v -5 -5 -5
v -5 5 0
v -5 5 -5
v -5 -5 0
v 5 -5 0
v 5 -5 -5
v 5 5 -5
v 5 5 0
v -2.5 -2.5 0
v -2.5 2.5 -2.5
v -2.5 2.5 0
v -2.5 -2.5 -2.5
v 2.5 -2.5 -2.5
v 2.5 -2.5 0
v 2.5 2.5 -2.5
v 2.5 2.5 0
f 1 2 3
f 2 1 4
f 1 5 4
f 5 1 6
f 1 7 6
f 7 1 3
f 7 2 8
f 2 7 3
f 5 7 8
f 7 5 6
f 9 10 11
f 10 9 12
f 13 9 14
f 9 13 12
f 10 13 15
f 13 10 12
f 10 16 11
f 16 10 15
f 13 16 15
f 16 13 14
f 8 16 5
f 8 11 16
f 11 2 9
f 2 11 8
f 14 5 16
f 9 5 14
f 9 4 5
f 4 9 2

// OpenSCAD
// In CGAL mode, there should be a cavity
difference() {
  polyhedron(convexity=2, faces=[[2,1,0],[3,1,2],[4,0,1],[4,1,5],[4,2,0],[6,2,4],[6,3,2],[7,3,6],[5,1,3],[5,3,7],[6,4,5],[6,5,7],[9,10,8],[9,11,10],[8,12,9],[9,12,13],[10,12,8],[10,14,12],[11,14,10],[11,15,14],[9,13,11],[11,13,15],[12,14,13],[13,14,15]],
points=[[-5,-5,-5],[-5,-5,5],[-5,5,-5],[-5,5,5],[5,-5,-5],[5,-5,5],[5,5,-5],[5,5,5],[-2.5,-2.5,-2.5],[-2.5,-2.5,2.5],[-2.5,2.5,-2.5],[-2.5,2.5,2.5],[2.5,-2.5,-2.5],[2.5,-2.5,2.5],[2.5,2.5,-2.5],[2.5,2.5,2.5]]);
  translate([0,0,10]) cube(20, center=true);
}
